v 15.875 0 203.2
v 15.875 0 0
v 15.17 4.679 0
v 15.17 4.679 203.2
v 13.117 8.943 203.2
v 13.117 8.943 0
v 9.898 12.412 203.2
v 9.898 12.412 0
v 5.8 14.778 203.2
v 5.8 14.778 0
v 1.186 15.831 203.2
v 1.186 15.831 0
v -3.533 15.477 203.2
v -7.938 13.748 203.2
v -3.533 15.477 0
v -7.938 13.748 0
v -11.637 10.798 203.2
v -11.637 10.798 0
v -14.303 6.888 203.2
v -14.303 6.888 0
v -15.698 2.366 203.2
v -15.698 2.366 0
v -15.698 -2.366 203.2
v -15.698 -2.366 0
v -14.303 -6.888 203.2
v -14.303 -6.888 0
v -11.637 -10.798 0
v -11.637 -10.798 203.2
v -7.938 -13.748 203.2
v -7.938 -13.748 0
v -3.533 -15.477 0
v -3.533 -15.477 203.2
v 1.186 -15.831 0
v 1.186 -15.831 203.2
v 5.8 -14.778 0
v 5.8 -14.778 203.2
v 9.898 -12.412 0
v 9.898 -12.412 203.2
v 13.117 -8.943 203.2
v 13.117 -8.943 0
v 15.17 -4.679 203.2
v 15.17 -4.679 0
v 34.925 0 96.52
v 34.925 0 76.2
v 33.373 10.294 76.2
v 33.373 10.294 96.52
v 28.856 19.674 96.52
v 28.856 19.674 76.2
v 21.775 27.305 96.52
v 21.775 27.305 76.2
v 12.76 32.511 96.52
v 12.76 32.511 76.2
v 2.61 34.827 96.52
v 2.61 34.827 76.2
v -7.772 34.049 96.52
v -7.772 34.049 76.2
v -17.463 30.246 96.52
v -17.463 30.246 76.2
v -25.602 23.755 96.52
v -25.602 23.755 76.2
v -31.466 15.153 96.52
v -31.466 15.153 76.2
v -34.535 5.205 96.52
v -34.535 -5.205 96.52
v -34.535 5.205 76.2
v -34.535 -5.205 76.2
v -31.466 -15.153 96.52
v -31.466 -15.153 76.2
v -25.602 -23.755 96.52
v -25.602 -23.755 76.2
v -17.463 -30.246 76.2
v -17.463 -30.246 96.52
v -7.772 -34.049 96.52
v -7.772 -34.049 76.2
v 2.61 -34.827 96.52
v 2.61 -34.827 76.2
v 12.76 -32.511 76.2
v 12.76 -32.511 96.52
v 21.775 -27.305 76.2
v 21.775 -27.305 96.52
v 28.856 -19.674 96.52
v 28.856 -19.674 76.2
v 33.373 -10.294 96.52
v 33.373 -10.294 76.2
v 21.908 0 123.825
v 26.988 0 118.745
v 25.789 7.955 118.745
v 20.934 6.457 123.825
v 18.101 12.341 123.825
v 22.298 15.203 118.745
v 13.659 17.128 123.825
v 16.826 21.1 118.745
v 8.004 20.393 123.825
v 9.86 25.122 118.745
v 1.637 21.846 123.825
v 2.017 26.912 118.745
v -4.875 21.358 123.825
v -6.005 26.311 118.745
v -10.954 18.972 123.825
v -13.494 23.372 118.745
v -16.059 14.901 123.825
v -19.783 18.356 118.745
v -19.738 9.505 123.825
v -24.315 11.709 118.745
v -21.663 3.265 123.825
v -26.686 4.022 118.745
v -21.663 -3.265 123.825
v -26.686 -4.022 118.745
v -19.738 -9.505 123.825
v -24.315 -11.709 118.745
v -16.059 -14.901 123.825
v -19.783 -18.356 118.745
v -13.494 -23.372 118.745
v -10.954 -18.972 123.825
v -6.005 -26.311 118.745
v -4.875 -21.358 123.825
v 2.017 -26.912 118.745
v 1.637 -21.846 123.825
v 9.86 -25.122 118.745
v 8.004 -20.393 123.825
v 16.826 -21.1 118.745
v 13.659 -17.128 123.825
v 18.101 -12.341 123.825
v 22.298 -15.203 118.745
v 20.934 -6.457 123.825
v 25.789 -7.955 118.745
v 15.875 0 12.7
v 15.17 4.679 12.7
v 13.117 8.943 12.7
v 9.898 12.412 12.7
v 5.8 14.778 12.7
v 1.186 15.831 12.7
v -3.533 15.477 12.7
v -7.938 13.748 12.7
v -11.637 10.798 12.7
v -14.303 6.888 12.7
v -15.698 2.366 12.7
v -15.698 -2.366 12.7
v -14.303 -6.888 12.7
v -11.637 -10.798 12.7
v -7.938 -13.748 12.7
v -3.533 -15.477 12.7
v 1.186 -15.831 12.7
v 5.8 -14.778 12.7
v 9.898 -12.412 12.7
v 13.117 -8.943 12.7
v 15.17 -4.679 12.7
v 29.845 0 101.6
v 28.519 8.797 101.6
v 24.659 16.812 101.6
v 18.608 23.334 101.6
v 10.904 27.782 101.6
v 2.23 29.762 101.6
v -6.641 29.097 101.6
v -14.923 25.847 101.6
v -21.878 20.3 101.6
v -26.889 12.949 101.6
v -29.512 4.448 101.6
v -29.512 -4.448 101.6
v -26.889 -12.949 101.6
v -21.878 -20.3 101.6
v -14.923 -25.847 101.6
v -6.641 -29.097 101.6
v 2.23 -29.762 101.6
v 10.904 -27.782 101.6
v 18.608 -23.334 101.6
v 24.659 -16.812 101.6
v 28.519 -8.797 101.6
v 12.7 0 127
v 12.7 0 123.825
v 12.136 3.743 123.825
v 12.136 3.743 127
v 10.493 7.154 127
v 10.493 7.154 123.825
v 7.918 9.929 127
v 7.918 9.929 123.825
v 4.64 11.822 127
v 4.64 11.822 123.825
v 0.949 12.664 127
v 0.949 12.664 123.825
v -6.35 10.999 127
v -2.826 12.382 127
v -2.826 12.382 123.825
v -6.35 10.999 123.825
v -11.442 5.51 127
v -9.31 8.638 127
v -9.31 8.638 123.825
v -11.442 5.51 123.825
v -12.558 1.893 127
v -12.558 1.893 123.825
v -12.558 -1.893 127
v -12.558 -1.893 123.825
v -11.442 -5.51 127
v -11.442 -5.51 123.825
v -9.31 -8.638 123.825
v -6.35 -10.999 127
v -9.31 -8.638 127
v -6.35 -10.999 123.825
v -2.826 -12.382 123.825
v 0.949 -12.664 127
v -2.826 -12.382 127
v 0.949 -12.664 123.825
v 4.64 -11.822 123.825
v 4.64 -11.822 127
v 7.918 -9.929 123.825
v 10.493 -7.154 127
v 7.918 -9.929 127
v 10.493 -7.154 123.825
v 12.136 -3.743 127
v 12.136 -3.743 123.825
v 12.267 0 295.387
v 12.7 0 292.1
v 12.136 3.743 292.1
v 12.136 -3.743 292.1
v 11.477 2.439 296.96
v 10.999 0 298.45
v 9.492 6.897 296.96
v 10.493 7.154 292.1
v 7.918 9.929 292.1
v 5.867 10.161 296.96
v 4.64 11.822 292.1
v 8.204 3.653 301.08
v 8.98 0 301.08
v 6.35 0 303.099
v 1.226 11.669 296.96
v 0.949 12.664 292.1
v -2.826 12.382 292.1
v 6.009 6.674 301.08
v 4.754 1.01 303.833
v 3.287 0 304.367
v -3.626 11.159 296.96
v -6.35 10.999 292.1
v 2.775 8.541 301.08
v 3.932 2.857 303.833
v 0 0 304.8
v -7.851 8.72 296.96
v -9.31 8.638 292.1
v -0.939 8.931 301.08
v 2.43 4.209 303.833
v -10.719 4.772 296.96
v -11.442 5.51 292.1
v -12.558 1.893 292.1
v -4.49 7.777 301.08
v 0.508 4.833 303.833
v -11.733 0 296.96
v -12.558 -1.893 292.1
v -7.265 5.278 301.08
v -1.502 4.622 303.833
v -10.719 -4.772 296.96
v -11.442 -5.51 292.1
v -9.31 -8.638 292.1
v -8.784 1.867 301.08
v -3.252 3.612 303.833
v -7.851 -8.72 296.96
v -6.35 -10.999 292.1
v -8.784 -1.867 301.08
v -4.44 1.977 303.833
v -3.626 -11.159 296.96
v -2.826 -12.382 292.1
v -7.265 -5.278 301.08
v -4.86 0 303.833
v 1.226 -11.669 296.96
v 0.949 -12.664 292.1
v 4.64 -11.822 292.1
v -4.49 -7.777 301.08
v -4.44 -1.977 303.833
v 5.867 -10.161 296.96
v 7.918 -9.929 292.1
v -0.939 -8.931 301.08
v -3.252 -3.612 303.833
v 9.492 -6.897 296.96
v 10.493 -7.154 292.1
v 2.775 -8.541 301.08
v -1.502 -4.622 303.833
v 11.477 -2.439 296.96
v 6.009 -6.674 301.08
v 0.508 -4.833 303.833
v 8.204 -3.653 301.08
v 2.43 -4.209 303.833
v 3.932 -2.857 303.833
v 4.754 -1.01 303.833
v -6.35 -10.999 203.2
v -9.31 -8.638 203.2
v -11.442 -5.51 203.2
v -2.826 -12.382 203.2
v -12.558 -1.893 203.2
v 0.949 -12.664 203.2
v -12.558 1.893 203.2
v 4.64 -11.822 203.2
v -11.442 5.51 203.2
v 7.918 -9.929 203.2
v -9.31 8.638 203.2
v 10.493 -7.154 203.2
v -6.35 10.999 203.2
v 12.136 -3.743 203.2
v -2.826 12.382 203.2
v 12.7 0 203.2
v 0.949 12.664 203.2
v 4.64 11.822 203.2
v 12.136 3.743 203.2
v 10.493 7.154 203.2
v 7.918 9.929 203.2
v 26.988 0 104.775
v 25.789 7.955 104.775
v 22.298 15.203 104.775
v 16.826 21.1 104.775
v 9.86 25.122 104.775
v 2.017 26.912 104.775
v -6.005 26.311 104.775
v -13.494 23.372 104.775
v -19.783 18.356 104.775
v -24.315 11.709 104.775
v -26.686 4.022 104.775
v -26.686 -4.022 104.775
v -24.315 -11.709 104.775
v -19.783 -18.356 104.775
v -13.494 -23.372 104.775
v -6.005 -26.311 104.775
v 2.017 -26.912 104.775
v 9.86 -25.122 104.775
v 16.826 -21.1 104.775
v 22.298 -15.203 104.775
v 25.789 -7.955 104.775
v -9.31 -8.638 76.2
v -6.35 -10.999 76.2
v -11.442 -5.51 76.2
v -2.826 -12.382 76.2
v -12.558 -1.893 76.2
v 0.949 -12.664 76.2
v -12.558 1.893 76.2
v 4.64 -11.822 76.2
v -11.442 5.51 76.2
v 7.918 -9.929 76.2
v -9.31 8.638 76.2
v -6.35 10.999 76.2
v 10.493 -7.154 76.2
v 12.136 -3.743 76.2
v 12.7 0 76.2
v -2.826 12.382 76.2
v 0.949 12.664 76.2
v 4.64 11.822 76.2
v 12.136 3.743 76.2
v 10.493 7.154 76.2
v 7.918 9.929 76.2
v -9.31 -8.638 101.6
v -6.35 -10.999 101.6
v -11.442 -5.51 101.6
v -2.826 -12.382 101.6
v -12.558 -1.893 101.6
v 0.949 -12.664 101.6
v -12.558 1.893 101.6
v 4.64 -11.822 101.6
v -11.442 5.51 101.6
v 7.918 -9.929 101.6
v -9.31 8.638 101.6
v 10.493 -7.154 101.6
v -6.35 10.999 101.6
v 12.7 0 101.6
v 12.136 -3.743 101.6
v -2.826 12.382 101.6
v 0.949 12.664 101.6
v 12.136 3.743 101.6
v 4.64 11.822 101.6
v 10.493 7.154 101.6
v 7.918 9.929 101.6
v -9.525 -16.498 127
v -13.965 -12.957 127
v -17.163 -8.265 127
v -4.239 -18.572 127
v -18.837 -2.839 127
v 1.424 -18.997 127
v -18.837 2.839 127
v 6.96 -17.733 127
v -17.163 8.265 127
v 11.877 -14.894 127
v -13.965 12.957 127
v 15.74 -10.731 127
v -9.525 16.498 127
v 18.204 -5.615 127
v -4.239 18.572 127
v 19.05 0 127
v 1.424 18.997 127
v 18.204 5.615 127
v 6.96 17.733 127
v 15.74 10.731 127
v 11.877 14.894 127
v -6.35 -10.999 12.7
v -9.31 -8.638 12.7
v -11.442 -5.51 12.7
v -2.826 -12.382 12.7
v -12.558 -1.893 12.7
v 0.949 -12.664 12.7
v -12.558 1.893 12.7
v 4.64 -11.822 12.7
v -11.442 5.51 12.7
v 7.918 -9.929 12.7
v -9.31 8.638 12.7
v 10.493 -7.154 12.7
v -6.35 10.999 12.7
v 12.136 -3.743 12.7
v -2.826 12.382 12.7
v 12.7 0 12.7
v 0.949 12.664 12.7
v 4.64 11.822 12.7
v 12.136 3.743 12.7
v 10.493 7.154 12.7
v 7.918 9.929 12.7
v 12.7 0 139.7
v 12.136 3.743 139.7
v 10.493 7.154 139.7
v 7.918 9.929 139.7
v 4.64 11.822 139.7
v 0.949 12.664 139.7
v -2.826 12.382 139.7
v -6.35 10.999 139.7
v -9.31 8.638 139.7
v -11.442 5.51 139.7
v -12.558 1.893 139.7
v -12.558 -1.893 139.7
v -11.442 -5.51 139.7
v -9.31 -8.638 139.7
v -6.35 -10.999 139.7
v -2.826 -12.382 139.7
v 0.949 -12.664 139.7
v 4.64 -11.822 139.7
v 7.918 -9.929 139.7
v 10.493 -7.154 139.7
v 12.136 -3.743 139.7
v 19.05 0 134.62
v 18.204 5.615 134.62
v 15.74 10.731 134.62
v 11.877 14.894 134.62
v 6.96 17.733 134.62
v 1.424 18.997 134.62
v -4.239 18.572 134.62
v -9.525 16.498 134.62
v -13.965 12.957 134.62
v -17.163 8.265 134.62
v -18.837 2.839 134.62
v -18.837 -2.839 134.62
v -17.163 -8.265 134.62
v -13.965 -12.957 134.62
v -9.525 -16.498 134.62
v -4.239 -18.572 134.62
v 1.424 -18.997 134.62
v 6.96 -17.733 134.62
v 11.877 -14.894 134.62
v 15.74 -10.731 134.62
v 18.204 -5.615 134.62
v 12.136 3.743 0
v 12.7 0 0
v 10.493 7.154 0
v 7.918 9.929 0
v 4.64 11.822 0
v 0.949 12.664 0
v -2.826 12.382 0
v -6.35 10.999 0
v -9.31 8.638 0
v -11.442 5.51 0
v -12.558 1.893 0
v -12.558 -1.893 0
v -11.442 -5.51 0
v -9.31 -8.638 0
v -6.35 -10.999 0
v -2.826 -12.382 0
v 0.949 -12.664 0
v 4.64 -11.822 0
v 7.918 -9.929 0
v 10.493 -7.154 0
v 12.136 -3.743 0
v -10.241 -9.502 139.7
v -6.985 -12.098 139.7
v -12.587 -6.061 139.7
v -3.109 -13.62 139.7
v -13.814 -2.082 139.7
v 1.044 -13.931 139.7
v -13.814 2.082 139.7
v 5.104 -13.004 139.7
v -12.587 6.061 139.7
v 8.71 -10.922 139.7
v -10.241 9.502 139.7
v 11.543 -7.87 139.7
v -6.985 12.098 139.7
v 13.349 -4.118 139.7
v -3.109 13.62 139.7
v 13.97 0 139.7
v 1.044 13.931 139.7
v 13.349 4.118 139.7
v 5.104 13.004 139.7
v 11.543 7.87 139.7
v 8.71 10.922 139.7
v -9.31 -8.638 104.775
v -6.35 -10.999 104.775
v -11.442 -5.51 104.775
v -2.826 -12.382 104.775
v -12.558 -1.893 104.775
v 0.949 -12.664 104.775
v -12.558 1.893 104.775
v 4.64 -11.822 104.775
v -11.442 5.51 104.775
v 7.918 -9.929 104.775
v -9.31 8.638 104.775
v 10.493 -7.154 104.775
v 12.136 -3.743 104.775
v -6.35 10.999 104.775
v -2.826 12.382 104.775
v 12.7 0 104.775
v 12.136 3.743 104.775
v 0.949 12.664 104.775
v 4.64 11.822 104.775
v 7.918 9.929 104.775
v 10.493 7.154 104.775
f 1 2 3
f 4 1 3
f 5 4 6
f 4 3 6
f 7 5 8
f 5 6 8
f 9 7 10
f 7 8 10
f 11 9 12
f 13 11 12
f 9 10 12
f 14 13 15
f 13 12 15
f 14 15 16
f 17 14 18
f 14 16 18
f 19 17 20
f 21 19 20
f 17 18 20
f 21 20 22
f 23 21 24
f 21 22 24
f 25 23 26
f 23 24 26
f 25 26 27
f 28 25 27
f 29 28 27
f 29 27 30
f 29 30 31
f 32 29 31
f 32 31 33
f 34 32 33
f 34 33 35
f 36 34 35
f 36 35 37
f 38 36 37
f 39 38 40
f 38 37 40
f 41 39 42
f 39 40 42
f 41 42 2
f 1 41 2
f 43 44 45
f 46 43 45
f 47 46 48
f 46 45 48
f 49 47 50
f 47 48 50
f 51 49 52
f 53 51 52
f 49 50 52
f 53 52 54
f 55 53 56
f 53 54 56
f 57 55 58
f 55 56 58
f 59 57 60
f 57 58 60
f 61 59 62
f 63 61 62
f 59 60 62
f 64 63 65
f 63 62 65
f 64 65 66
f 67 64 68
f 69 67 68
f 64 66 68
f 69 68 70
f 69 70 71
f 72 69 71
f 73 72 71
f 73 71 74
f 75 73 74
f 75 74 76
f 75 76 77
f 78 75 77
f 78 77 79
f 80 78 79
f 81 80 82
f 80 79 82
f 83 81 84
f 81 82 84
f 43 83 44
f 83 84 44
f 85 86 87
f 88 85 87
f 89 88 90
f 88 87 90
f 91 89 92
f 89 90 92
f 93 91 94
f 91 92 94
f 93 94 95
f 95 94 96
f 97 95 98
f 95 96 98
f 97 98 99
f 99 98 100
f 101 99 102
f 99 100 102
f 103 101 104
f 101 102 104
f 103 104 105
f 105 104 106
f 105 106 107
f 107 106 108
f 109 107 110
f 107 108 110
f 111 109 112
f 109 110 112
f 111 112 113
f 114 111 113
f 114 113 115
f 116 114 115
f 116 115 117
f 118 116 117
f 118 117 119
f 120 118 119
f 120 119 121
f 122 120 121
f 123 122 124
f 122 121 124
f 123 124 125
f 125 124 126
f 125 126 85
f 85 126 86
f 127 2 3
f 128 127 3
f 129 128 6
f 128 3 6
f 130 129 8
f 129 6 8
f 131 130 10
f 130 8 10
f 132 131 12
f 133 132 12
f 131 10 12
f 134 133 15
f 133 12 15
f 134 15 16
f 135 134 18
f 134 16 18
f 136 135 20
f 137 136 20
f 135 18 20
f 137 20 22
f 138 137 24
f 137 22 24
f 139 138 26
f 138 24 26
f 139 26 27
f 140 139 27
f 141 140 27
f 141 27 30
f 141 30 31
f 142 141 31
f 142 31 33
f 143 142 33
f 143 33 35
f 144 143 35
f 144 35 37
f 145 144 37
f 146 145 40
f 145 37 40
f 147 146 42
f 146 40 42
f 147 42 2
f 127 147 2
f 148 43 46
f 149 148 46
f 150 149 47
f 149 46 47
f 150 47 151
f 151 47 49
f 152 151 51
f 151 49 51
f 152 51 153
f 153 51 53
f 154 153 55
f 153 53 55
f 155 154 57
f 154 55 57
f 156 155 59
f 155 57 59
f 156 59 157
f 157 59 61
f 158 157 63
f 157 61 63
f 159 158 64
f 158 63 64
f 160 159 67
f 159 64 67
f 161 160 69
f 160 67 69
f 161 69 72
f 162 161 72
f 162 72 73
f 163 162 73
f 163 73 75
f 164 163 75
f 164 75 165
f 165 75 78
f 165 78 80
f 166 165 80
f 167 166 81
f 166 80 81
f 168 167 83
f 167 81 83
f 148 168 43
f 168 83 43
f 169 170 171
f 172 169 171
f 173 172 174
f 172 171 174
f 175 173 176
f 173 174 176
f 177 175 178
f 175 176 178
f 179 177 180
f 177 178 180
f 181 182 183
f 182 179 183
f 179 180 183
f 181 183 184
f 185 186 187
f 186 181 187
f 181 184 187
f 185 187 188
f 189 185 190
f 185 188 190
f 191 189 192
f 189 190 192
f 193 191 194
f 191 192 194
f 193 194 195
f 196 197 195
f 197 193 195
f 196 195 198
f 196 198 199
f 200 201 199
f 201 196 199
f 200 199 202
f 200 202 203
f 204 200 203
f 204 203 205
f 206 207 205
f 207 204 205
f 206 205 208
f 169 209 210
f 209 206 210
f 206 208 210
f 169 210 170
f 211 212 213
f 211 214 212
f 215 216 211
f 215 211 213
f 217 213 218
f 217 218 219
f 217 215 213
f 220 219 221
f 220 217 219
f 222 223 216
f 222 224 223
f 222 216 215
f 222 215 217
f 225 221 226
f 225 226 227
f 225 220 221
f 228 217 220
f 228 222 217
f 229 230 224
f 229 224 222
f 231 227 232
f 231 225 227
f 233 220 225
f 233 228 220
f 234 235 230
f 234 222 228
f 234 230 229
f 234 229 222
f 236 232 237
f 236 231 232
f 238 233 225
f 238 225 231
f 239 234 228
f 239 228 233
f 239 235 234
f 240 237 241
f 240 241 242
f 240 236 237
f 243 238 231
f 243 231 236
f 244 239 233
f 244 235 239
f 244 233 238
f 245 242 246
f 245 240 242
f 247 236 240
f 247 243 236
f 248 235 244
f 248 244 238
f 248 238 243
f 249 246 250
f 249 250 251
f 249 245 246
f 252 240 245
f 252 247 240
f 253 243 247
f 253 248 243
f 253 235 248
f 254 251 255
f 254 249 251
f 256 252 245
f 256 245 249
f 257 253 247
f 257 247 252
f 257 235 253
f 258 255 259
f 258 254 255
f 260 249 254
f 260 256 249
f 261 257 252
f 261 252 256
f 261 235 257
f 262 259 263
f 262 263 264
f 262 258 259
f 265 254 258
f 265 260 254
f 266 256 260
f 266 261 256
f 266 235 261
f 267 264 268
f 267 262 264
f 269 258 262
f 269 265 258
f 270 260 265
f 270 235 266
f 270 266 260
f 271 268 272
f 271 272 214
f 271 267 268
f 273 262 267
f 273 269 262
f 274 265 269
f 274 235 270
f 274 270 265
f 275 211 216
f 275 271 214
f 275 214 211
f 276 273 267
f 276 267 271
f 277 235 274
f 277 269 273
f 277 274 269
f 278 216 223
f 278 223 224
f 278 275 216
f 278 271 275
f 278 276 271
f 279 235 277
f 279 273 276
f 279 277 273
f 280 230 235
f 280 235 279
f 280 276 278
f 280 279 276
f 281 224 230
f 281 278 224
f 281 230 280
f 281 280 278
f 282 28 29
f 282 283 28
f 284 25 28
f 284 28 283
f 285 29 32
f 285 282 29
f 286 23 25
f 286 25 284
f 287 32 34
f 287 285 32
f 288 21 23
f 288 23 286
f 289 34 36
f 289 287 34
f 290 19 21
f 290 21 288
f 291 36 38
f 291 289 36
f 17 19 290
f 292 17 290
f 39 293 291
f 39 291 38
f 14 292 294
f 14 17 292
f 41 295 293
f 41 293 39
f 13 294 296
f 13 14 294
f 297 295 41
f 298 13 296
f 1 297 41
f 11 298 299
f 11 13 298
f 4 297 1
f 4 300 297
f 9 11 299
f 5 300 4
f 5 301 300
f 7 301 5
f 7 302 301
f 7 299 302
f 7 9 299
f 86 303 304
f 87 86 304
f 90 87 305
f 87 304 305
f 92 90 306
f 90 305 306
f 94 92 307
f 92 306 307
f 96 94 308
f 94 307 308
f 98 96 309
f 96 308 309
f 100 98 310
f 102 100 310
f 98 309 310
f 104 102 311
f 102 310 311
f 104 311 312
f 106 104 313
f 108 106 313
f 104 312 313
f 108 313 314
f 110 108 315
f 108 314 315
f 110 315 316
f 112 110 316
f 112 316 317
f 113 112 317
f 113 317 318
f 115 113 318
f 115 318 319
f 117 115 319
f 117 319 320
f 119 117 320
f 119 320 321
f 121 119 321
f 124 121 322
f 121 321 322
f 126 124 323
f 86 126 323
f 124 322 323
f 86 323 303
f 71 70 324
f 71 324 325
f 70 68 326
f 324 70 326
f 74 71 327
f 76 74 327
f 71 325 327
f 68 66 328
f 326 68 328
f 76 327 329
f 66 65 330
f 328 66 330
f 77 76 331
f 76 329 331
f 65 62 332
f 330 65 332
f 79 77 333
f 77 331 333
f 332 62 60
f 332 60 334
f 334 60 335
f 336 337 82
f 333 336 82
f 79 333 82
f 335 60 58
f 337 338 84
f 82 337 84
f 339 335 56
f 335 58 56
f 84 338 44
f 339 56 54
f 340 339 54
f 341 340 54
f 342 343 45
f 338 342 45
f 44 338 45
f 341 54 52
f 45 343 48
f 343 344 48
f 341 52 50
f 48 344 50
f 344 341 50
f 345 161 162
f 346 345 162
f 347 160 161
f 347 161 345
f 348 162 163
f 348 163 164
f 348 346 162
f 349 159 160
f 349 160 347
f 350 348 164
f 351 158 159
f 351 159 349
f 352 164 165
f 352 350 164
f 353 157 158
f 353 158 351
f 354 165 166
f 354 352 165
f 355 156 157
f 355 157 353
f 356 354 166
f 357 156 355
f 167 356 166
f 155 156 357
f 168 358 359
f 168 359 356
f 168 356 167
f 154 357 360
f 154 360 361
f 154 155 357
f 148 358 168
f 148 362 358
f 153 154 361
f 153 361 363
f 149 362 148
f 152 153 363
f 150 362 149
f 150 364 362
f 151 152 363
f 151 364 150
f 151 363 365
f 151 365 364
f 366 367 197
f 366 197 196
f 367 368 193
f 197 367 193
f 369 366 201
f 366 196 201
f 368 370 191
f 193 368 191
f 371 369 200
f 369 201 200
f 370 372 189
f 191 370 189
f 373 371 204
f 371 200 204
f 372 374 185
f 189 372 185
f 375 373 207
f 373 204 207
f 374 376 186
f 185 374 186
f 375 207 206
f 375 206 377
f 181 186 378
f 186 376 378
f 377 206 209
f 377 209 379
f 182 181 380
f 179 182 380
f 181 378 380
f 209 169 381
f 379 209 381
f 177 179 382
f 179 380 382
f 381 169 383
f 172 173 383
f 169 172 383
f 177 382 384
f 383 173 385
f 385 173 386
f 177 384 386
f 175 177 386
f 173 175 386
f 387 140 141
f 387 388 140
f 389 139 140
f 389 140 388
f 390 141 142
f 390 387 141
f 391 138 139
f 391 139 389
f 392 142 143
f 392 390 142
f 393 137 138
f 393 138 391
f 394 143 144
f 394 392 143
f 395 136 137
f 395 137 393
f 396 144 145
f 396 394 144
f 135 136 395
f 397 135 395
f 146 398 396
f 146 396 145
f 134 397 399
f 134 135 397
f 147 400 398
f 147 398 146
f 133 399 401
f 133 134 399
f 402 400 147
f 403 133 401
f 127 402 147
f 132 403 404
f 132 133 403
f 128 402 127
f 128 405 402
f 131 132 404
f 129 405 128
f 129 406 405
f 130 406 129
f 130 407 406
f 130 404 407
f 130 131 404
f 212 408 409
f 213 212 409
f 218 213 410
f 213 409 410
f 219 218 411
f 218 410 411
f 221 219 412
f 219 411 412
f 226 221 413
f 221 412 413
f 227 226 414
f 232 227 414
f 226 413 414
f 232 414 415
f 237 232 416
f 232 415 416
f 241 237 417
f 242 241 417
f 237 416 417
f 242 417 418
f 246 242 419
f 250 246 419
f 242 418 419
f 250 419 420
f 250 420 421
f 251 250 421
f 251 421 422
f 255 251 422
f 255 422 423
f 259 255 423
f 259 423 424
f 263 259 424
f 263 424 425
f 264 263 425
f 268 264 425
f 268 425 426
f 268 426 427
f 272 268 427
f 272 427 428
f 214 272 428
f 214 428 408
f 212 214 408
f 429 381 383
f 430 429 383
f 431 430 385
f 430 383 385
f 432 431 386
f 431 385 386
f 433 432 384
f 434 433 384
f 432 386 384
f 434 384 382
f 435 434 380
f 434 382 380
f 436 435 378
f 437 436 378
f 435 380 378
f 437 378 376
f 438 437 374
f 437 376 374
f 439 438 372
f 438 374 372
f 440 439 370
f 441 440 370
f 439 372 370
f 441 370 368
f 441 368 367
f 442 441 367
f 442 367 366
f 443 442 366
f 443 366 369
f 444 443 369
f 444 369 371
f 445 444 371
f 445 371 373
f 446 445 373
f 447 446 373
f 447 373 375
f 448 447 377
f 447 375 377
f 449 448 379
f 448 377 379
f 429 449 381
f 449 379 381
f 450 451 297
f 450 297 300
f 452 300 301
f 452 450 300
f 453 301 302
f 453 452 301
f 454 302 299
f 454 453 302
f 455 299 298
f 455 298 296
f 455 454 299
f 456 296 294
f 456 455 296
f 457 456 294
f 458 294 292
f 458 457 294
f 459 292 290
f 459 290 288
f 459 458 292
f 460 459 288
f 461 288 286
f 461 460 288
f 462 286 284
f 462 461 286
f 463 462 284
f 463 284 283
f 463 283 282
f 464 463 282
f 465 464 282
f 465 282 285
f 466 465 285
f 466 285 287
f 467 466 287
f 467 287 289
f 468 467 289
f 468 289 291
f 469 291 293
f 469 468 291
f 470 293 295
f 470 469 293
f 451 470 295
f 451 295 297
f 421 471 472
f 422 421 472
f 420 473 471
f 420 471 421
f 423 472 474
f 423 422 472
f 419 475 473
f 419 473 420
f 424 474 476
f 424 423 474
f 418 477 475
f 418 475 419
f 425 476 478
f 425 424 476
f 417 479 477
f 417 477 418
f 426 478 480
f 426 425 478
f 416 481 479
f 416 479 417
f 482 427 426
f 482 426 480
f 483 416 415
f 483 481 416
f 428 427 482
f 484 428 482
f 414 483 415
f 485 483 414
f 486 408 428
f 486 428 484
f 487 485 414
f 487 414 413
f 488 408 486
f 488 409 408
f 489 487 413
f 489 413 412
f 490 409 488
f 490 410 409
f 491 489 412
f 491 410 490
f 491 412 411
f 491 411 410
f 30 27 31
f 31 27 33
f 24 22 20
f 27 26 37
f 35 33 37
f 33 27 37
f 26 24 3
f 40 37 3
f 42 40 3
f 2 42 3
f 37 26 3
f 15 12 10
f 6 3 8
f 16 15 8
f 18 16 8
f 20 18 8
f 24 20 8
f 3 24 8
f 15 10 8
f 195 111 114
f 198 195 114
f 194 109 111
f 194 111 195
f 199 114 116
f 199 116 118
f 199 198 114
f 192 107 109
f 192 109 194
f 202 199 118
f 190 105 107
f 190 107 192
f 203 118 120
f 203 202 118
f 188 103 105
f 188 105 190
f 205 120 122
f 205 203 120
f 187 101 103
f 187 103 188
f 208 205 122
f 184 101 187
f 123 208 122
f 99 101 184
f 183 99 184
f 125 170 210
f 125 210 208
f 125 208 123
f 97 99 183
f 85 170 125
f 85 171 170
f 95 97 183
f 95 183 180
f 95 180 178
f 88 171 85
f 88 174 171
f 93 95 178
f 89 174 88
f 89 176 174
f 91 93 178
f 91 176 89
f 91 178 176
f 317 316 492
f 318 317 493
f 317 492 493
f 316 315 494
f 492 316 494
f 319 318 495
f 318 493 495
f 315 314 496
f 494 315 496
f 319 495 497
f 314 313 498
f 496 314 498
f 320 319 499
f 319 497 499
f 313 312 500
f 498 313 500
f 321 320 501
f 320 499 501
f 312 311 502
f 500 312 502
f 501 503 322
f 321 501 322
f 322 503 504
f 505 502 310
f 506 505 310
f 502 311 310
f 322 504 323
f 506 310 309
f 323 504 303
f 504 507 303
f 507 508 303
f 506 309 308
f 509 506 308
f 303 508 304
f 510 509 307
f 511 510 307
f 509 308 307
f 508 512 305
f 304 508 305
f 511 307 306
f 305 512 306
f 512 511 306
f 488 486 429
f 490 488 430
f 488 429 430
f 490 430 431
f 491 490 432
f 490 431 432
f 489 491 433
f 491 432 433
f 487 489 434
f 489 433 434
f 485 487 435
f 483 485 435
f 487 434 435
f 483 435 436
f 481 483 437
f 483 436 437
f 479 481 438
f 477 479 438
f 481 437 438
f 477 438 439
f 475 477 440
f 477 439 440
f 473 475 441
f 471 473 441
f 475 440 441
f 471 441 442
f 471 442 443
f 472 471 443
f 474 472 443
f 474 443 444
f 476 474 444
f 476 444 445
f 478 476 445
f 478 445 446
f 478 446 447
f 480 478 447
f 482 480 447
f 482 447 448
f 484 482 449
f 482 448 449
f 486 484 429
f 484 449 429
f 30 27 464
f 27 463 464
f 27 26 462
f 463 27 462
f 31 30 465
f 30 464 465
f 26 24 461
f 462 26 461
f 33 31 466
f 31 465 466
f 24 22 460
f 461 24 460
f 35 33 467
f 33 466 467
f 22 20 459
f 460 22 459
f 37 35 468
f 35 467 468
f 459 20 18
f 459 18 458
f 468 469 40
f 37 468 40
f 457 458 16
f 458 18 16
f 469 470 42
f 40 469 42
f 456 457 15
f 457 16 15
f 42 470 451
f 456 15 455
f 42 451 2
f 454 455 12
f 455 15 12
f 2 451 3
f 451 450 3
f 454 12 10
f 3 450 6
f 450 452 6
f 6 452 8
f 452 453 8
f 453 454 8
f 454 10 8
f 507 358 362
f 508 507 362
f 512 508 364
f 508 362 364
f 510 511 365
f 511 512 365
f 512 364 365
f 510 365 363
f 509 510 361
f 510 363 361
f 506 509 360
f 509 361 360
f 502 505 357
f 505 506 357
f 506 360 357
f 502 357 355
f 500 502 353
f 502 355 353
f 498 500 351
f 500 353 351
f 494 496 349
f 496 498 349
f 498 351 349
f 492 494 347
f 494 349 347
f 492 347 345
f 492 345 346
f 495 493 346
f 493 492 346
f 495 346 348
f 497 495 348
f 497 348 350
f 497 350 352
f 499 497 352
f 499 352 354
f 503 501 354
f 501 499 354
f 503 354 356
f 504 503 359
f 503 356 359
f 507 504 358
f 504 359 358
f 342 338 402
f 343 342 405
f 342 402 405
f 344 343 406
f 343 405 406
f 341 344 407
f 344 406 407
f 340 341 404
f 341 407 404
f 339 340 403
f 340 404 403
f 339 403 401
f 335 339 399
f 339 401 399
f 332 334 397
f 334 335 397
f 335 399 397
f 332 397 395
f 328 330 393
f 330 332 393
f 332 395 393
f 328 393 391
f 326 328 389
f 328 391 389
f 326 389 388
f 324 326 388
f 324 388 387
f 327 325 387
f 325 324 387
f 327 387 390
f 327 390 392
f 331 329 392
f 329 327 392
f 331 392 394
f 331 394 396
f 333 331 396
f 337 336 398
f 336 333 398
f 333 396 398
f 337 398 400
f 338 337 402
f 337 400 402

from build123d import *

# Parameters (mm, degrees)
F0_R      = 12.7
F1_DEPTH  = 304.8
F5_R      = 34.925
F8_DEPTH  = 25.4
F6_R      = 26.9875
F9_DEPTH  = 19.05
F7_R      = 19.05
F0_R_2    = 15.875
F10_DEPTH = 12.7
F11_R     = 12.7
F12_SIZE  = 5.08
F13_DEPTH = 203.2


with BuildPart() as f1:
    # F0 (on Top) → F1 (new body)
    with BuildSketch(Plane.XY):
        Circle(F0_R)
    extrude(amount=F1_DEPTH)

    # F5 (on offset) → F8 (join)
    with BuildSketch(Plane.XY.offset(76.2)):
        Circle(F5_R)
    extrude(amount=F8_DEPTH)

    # F6 (on offset) → F9 (join)
    with BuildSketch(Plane.XY.offset(104.775)):
        Circle(F6_R)
    extrude(amount=F9_DEPTH)

    # F7 (on offset) + F0 (on Top) → F10 (join)
    with BuildSketch(Plane.XY.offset(127)):
        Circle(F7_R)
    with BuildSketch(Plane.XY):
        Circle(F0_R_2)
        Circle(F0_R, mode=Mode.SUBTRACT)
    extrude(amount=F10_DEPTH)

    # F11
    f11_edges = [f1.edges().sort_by_distance(p)[0] for p in [
        (-12.7, 0, 304.8),
    ]]
    fillet(f11_edges, radius=F11_R)

    # F12
    f12_edges = [f1.edges().sort_by_distance(p)[0] for p in [
        (-19.05, 0, 139.7),
        (-26.9875, 0, 123.825),
        (-34.925, 0, 101.6),
    ]]
    chamfer(f12_edges, length=F12_SIZE)


with BuildPart() as f13:
    # F0 (on Top) → F13 (new body)
    with BuildSketch(Plane.XY):
        Circle(F0_R_2)
        Circle(F0_R, mode=Mode.SUBTRACT)
    extrude(amount=F13_DEPTH)


solid = Compound([f1.part, f13.part])
